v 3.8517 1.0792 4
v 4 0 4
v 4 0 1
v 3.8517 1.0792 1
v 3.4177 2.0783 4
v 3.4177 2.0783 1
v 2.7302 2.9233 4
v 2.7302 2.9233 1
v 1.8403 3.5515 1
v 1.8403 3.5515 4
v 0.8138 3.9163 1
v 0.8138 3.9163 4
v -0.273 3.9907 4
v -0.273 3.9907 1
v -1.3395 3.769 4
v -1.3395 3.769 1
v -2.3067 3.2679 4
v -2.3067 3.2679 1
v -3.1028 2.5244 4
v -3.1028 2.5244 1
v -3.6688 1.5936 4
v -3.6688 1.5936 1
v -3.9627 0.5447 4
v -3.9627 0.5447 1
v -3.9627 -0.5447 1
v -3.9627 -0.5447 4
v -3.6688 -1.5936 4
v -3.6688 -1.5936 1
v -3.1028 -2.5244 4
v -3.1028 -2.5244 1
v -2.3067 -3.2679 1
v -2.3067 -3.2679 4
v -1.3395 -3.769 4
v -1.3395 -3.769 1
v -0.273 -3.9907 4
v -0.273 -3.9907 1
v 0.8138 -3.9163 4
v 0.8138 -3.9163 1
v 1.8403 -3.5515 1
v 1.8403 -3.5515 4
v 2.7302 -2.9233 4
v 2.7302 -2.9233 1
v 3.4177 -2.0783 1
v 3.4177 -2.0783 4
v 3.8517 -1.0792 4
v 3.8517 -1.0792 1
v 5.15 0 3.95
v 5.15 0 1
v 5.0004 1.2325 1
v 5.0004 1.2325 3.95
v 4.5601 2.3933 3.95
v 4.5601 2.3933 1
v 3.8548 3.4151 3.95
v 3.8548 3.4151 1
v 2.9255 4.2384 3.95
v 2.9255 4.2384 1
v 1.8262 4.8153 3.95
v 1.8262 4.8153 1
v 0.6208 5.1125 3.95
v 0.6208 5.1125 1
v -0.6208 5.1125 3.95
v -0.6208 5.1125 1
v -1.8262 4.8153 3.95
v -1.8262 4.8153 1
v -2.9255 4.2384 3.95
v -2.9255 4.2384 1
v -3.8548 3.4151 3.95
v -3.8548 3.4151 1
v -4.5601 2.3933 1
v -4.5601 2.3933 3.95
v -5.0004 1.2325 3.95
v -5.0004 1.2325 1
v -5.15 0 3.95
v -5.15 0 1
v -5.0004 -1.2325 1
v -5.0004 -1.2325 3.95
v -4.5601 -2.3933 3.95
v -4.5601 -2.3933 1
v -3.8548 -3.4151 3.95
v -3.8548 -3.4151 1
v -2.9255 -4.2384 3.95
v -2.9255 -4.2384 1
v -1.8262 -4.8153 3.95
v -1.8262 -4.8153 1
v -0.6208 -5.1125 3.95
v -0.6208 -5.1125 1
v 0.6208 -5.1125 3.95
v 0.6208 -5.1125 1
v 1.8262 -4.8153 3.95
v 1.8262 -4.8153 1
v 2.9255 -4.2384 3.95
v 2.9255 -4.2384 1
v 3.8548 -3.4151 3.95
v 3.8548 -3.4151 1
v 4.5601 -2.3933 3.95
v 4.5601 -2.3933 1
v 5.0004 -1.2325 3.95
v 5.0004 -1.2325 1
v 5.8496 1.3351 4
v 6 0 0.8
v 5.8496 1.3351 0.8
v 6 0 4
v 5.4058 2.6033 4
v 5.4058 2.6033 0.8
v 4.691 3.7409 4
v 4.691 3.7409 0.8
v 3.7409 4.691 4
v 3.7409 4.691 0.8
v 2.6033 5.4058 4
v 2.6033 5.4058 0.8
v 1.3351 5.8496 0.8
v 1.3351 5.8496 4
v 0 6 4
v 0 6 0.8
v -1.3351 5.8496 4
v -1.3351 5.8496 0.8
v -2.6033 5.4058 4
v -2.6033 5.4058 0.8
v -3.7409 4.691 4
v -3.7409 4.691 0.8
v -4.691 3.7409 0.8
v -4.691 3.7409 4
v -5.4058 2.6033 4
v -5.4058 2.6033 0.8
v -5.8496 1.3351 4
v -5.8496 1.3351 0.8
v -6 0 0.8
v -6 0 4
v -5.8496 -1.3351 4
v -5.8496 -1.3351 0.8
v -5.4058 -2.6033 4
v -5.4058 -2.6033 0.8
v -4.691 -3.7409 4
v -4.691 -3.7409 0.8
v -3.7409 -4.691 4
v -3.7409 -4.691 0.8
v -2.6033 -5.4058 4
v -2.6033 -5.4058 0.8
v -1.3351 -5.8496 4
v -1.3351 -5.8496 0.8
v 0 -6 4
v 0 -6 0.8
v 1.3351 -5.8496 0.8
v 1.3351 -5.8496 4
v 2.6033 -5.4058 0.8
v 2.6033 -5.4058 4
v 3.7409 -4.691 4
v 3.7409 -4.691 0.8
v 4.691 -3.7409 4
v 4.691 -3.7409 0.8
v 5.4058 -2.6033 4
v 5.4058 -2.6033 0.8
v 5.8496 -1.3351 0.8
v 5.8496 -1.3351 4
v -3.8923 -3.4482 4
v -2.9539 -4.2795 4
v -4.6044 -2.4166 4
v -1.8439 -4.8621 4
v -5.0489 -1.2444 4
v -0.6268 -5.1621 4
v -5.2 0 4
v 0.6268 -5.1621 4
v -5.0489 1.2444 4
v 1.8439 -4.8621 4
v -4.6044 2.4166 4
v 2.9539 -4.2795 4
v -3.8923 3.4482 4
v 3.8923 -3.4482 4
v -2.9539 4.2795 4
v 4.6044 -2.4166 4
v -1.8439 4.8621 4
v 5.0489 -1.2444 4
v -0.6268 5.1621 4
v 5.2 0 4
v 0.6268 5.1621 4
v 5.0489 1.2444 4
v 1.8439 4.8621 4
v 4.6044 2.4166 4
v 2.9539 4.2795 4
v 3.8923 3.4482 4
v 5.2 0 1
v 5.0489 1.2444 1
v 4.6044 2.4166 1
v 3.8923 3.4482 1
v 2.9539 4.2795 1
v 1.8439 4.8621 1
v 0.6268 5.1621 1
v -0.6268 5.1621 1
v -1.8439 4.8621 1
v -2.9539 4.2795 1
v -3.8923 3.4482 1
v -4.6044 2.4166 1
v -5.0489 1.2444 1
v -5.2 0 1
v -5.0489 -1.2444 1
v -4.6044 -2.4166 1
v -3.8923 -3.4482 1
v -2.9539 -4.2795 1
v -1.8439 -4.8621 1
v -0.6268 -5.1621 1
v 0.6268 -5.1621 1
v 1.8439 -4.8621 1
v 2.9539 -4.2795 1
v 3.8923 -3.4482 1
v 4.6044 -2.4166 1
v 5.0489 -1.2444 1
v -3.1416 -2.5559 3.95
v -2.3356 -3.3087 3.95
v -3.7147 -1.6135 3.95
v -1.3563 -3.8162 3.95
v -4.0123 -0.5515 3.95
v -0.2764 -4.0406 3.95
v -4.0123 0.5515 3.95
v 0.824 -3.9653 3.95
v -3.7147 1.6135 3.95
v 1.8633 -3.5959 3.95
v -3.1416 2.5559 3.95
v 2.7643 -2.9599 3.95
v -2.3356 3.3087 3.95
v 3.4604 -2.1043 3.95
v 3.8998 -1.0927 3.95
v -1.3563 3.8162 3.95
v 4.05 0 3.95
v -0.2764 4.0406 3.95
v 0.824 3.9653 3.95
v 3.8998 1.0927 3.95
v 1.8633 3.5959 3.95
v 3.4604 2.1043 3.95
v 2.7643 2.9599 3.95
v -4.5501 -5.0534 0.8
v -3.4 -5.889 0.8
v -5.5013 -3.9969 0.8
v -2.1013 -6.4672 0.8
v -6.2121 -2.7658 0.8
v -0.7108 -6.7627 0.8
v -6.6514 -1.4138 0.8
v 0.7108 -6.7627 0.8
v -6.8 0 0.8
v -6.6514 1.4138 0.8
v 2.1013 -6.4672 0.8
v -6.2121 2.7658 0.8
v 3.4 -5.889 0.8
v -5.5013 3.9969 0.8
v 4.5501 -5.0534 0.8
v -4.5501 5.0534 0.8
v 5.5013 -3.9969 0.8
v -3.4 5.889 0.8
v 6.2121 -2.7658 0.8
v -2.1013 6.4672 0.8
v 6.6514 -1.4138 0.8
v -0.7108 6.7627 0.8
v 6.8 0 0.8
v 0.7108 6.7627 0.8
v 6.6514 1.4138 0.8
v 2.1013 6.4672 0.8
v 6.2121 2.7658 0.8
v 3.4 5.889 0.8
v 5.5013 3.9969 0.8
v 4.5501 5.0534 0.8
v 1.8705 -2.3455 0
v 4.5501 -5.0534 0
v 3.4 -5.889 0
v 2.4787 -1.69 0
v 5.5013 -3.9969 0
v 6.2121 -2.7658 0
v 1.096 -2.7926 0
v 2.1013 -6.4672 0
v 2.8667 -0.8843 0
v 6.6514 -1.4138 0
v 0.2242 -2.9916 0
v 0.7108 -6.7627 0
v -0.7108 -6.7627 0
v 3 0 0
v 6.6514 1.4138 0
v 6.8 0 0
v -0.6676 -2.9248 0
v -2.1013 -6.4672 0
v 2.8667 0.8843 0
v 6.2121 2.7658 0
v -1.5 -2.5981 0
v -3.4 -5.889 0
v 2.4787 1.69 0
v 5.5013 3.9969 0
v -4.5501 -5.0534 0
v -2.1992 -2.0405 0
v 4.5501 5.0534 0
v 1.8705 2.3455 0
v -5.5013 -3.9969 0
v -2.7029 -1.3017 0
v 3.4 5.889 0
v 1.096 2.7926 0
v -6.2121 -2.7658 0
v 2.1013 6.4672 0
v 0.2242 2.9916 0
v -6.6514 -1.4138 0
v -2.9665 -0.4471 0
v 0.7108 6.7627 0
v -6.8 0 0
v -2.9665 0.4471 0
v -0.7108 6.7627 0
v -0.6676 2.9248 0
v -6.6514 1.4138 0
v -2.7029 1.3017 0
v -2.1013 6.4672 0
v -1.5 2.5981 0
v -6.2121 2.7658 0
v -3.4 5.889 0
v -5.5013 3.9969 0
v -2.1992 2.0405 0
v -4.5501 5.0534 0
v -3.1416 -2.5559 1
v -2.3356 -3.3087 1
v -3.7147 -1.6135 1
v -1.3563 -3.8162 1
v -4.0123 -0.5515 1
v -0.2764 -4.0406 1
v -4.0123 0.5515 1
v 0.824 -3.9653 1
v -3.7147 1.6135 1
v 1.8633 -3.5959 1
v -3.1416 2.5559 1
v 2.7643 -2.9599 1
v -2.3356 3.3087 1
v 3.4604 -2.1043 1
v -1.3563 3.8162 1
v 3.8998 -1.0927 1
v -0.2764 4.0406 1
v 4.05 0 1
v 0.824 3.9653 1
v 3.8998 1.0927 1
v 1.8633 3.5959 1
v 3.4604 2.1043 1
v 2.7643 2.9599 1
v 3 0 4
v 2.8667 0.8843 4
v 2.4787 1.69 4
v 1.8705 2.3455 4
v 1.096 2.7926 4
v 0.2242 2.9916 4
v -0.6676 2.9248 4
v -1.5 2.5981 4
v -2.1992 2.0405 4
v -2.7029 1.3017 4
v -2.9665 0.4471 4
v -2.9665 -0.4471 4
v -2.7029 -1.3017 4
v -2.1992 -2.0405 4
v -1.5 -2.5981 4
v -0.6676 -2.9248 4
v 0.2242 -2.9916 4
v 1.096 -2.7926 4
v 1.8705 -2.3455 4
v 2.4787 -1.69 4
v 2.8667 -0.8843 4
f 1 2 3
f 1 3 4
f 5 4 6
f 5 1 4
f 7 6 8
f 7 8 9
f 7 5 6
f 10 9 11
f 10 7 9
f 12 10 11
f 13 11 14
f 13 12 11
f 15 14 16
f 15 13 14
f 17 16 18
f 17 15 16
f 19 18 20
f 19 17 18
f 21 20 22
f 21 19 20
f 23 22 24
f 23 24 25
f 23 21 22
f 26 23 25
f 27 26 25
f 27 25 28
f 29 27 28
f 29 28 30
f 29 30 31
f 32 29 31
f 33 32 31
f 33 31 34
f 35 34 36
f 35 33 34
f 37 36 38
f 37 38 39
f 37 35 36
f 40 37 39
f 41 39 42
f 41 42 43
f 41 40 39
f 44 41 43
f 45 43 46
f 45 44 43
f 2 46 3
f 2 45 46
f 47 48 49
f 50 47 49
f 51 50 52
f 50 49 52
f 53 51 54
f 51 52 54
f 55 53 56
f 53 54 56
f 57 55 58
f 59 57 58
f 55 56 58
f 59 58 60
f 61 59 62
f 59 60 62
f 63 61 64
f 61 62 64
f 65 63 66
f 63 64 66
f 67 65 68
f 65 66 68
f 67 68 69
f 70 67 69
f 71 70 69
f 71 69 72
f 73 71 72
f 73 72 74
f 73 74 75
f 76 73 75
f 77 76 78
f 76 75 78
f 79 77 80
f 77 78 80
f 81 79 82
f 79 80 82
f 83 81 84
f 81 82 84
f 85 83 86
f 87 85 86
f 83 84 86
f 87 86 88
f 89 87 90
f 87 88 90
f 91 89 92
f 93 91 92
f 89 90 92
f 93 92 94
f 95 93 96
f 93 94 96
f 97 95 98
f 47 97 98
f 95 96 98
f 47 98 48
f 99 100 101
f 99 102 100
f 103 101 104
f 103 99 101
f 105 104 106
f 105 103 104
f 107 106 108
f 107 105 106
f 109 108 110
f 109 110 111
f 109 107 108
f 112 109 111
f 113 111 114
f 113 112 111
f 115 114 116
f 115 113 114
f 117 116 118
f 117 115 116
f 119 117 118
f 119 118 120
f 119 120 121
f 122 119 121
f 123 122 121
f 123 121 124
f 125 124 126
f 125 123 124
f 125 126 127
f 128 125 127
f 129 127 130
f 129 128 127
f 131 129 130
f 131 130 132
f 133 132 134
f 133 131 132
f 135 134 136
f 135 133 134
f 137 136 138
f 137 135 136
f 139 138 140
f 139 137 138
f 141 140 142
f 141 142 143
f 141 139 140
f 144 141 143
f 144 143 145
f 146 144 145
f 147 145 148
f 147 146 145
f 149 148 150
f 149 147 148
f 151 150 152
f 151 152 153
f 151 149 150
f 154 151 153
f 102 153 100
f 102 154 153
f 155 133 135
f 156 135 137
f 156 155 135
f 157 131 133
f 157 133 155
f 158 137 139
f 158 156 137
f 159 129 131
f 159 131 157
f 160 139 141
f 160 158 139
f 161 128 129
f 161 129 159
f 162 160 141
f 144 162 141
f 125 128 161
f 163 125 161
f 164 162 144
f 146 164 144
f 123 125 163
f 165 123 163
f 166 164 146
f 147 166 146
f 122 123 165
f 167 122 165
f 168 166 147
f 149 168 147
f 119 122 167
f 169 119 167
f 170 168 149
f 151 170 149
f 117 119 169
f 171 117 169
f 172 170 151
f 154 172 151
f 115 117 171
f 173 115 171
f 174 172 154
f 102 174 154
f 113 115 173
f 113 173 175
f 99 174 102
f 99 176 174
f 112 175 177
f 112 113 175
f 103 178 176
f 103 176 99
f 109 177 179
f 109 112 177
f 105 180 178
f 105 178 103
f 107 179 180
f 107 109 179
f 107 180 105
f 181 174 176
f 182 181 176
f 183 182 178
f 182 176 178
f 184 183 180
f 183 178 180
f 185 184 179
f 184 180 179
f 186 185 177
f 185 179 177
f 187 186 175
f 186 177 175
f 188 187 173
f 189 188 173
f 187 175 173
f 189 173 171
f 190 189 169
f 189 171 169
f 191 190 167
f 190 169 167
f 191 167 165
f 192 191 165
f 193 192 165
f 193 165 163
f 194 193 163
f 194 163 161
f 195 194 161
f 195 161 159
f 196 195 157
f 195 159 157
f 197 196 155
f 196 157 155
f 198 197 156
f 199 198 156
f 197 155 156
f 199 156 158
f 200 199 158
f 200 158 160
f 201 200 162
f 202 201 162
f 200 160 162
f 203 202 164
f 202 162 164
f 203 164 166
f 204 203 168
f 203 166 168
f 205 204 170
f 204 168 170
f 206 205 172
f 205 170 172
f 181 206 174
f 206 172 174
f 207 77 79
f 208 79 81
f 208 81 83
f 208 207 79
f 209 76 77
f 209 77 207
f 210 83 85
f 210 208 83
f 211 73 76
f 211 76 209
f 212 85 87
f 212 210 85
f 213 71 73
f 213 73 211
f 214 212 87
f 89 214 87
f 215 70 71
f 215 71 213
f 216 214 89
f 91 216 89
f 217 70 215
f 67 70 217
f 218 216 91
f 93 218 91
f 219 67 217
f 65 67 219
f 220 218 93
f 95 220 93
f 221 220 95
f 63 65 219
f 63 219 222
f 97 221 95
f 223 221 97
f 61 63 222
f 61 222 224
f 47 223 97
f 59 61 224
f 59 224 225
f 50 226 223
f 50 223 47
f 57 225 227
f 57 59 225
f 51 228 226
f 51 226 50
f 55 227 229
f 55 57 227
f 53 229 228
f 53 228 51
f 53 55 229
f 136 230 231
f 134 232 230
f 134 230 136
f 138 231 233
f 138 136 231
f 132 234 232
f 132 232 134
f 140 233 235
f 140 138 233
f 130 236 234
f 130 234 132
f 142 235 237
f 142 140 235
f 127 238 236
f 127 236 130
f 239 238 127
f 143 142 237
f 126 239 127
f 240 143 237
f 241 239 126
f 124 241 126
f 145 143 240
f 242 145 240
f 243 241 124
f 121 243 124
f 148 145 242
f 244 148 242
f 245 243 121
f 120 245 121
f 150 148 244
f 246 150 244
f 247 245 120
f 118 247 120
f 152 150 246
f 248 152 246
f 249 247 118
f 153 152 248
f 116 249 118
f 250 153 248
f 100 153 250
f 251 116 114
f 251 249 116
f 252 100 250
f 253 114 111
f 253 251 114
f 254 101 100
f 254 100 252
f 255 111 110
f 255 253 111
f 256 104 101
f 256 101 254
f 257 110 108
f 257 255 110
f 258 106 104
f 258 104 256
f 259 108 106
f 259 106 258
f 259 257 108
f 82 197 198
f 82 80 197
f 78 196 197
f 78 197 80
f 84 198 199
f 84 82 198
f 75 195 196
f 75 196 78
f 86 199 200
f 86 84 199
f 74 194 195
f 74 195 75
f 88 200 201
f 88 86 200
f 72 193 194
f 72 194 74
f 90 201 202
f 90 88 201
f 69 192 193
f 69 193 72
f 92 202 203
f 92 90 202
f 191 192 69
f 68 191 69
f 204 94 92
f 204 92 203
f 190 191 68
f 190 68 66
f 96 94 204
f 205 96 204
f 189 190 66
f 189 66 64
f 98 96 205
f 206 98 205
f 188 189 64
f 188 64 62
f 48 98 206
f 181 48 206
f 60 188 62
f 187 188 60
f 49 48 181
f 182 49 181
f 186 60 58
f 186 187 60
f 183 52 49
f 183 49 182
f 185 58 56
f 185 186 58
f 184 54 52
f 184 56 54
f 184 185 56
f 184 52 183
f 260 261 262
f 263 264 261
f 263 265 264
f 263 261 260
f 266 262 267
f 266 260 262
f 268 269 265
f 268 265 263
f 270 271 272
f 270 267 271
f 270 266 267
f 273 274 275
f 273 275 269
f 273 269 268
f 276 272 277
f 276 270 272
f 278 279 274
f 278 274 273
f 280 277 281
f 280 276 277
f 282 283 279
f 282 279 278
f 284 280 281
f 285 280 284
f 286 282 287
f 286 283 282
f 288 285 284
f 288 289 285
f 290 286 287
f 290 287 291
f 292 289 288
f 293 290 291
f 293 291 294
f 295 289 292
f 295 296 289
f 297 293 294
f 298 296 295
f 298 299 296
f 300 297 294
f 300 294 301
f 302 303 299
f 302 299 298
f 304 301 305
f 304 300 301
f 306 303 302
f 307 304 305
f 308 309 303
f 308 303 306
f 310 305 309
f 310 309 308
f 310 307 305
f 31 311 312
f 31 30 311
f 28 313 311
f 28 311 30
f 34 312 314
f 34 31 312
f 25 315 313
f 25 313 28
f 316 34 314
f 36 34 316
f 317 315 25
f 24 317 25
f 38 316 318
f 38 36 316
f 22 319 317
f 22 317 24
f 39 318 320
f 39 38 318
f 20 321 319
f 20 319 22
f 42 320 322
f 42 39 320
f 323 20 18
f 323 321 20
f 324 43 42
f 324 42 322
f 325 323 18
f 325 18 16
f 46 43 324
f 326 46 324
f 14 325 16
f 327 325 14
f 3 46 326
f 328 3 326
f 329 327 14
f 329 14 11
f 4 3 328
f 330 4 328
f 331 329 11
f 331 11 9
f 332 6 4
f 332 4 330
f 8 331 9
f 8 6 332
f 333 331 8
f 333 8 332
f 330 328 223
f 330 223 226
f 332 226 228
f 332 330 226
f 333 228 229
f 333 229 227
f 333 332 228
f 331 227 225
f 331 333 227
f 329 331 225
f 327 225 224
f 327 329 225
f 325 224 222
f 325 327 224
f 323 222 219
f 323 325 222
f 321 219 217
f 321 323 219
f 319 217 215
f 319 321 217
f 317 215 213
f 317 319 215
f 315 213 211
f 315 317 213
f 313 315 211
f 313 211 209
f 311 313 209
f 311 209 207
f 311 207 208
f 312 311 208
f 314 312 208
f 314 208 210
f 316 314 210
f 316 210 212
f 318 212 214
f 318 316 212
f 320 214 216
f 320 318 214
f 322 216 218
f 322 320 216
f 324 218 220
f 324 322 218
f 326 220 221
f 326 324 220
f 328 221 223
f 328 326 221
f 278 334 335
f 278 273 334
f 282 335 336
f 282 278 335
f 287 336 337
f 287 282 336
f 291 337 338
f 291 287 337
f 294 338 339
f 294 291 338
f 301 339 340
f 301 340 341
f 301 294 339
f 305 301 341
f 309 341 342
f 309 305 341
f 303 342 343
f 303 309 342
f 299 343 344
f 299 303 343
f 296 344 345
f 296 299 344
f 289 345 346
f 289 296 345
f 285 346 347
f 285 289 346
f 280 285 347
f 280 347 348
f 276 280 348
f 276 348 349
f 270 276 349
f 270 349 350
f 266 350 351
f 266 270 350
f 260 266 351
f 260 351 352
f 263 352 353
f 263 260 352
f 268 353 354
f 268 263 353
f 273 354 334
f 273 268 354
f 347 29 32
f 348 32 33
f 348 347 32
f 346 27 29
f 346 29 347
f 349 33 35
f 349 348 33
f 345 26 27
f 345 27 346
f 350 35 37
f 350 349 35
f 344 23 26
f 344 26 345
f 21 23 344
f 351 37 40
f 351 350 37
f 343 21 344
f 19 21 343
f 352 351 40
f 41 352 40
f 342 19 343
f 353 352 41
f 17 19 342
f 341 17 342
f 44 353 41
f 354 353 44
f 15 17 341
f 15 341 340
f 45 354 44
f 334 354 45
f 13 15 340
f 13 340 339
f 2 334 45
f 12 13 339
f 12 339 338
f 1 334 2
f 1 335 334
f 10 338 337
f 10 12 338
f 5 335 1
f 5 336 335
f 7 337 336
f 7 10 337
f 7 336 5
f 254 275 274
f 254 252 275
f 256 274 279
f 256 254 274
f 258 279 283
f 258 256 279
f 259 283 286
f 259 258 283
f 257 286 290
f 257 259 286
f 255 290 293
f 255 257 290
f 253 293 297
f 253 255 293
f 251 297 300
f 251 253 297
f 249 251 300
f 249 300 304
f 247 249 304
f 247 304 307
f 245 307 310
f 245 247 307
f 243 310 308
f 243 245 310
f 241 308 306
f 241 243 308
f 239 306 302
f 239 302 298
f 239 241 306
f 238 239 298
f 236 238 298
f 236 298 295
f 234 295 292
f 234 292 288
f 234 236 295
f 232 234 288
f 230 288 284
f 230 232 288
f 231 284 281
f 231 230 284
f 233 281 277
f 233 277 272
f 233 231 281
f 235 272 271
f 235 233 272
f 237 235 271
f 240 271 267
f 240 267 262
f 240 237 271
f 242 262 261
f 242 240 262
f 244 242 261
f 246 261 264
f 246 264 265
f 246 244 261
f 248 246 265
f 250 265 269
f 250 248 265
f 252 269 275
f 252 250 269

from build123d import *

# Parameters (mm, degrees)
F2_R     = 5.2
F2_R_2   = 4
F3_DEPTH = 3
F4_R     = 5.15
F4_R_2   = 4.05
F5_DEPTH = 2.95


with BuildPart() as f1:
    # F0 (on Front) → F1 (revolve)
    with BuildSketch(Plane.XZ):
        Polygon((3, 4), (3, 0), (6.8, 0), (6.8, 0.8), (6, 0.8), (6, 4), align=None)
    revolve(axis=Axis((0, 0, 2), (0, 0, 1)))

    # F2 (on face) → F3 (cut)
    with BuildSketch(Plane.XY.offset(4)):
        Circle(F2_R)
        Circle(F2_R_2, mode=Mode.SUBTRACT)
    extrude(amount=-F3_DEPTH, mode=Mode.SUBTRACT)

    # F4 (on face) → F5 (join)
    with BuildSketch(Plane.XY.offset(1)):
        Circle(F4_R)
        Circle(F4_R_2, mode=Mode.SUBTRACT)
    extrude(amount=F5_DEPTH)


solid = f1.part
